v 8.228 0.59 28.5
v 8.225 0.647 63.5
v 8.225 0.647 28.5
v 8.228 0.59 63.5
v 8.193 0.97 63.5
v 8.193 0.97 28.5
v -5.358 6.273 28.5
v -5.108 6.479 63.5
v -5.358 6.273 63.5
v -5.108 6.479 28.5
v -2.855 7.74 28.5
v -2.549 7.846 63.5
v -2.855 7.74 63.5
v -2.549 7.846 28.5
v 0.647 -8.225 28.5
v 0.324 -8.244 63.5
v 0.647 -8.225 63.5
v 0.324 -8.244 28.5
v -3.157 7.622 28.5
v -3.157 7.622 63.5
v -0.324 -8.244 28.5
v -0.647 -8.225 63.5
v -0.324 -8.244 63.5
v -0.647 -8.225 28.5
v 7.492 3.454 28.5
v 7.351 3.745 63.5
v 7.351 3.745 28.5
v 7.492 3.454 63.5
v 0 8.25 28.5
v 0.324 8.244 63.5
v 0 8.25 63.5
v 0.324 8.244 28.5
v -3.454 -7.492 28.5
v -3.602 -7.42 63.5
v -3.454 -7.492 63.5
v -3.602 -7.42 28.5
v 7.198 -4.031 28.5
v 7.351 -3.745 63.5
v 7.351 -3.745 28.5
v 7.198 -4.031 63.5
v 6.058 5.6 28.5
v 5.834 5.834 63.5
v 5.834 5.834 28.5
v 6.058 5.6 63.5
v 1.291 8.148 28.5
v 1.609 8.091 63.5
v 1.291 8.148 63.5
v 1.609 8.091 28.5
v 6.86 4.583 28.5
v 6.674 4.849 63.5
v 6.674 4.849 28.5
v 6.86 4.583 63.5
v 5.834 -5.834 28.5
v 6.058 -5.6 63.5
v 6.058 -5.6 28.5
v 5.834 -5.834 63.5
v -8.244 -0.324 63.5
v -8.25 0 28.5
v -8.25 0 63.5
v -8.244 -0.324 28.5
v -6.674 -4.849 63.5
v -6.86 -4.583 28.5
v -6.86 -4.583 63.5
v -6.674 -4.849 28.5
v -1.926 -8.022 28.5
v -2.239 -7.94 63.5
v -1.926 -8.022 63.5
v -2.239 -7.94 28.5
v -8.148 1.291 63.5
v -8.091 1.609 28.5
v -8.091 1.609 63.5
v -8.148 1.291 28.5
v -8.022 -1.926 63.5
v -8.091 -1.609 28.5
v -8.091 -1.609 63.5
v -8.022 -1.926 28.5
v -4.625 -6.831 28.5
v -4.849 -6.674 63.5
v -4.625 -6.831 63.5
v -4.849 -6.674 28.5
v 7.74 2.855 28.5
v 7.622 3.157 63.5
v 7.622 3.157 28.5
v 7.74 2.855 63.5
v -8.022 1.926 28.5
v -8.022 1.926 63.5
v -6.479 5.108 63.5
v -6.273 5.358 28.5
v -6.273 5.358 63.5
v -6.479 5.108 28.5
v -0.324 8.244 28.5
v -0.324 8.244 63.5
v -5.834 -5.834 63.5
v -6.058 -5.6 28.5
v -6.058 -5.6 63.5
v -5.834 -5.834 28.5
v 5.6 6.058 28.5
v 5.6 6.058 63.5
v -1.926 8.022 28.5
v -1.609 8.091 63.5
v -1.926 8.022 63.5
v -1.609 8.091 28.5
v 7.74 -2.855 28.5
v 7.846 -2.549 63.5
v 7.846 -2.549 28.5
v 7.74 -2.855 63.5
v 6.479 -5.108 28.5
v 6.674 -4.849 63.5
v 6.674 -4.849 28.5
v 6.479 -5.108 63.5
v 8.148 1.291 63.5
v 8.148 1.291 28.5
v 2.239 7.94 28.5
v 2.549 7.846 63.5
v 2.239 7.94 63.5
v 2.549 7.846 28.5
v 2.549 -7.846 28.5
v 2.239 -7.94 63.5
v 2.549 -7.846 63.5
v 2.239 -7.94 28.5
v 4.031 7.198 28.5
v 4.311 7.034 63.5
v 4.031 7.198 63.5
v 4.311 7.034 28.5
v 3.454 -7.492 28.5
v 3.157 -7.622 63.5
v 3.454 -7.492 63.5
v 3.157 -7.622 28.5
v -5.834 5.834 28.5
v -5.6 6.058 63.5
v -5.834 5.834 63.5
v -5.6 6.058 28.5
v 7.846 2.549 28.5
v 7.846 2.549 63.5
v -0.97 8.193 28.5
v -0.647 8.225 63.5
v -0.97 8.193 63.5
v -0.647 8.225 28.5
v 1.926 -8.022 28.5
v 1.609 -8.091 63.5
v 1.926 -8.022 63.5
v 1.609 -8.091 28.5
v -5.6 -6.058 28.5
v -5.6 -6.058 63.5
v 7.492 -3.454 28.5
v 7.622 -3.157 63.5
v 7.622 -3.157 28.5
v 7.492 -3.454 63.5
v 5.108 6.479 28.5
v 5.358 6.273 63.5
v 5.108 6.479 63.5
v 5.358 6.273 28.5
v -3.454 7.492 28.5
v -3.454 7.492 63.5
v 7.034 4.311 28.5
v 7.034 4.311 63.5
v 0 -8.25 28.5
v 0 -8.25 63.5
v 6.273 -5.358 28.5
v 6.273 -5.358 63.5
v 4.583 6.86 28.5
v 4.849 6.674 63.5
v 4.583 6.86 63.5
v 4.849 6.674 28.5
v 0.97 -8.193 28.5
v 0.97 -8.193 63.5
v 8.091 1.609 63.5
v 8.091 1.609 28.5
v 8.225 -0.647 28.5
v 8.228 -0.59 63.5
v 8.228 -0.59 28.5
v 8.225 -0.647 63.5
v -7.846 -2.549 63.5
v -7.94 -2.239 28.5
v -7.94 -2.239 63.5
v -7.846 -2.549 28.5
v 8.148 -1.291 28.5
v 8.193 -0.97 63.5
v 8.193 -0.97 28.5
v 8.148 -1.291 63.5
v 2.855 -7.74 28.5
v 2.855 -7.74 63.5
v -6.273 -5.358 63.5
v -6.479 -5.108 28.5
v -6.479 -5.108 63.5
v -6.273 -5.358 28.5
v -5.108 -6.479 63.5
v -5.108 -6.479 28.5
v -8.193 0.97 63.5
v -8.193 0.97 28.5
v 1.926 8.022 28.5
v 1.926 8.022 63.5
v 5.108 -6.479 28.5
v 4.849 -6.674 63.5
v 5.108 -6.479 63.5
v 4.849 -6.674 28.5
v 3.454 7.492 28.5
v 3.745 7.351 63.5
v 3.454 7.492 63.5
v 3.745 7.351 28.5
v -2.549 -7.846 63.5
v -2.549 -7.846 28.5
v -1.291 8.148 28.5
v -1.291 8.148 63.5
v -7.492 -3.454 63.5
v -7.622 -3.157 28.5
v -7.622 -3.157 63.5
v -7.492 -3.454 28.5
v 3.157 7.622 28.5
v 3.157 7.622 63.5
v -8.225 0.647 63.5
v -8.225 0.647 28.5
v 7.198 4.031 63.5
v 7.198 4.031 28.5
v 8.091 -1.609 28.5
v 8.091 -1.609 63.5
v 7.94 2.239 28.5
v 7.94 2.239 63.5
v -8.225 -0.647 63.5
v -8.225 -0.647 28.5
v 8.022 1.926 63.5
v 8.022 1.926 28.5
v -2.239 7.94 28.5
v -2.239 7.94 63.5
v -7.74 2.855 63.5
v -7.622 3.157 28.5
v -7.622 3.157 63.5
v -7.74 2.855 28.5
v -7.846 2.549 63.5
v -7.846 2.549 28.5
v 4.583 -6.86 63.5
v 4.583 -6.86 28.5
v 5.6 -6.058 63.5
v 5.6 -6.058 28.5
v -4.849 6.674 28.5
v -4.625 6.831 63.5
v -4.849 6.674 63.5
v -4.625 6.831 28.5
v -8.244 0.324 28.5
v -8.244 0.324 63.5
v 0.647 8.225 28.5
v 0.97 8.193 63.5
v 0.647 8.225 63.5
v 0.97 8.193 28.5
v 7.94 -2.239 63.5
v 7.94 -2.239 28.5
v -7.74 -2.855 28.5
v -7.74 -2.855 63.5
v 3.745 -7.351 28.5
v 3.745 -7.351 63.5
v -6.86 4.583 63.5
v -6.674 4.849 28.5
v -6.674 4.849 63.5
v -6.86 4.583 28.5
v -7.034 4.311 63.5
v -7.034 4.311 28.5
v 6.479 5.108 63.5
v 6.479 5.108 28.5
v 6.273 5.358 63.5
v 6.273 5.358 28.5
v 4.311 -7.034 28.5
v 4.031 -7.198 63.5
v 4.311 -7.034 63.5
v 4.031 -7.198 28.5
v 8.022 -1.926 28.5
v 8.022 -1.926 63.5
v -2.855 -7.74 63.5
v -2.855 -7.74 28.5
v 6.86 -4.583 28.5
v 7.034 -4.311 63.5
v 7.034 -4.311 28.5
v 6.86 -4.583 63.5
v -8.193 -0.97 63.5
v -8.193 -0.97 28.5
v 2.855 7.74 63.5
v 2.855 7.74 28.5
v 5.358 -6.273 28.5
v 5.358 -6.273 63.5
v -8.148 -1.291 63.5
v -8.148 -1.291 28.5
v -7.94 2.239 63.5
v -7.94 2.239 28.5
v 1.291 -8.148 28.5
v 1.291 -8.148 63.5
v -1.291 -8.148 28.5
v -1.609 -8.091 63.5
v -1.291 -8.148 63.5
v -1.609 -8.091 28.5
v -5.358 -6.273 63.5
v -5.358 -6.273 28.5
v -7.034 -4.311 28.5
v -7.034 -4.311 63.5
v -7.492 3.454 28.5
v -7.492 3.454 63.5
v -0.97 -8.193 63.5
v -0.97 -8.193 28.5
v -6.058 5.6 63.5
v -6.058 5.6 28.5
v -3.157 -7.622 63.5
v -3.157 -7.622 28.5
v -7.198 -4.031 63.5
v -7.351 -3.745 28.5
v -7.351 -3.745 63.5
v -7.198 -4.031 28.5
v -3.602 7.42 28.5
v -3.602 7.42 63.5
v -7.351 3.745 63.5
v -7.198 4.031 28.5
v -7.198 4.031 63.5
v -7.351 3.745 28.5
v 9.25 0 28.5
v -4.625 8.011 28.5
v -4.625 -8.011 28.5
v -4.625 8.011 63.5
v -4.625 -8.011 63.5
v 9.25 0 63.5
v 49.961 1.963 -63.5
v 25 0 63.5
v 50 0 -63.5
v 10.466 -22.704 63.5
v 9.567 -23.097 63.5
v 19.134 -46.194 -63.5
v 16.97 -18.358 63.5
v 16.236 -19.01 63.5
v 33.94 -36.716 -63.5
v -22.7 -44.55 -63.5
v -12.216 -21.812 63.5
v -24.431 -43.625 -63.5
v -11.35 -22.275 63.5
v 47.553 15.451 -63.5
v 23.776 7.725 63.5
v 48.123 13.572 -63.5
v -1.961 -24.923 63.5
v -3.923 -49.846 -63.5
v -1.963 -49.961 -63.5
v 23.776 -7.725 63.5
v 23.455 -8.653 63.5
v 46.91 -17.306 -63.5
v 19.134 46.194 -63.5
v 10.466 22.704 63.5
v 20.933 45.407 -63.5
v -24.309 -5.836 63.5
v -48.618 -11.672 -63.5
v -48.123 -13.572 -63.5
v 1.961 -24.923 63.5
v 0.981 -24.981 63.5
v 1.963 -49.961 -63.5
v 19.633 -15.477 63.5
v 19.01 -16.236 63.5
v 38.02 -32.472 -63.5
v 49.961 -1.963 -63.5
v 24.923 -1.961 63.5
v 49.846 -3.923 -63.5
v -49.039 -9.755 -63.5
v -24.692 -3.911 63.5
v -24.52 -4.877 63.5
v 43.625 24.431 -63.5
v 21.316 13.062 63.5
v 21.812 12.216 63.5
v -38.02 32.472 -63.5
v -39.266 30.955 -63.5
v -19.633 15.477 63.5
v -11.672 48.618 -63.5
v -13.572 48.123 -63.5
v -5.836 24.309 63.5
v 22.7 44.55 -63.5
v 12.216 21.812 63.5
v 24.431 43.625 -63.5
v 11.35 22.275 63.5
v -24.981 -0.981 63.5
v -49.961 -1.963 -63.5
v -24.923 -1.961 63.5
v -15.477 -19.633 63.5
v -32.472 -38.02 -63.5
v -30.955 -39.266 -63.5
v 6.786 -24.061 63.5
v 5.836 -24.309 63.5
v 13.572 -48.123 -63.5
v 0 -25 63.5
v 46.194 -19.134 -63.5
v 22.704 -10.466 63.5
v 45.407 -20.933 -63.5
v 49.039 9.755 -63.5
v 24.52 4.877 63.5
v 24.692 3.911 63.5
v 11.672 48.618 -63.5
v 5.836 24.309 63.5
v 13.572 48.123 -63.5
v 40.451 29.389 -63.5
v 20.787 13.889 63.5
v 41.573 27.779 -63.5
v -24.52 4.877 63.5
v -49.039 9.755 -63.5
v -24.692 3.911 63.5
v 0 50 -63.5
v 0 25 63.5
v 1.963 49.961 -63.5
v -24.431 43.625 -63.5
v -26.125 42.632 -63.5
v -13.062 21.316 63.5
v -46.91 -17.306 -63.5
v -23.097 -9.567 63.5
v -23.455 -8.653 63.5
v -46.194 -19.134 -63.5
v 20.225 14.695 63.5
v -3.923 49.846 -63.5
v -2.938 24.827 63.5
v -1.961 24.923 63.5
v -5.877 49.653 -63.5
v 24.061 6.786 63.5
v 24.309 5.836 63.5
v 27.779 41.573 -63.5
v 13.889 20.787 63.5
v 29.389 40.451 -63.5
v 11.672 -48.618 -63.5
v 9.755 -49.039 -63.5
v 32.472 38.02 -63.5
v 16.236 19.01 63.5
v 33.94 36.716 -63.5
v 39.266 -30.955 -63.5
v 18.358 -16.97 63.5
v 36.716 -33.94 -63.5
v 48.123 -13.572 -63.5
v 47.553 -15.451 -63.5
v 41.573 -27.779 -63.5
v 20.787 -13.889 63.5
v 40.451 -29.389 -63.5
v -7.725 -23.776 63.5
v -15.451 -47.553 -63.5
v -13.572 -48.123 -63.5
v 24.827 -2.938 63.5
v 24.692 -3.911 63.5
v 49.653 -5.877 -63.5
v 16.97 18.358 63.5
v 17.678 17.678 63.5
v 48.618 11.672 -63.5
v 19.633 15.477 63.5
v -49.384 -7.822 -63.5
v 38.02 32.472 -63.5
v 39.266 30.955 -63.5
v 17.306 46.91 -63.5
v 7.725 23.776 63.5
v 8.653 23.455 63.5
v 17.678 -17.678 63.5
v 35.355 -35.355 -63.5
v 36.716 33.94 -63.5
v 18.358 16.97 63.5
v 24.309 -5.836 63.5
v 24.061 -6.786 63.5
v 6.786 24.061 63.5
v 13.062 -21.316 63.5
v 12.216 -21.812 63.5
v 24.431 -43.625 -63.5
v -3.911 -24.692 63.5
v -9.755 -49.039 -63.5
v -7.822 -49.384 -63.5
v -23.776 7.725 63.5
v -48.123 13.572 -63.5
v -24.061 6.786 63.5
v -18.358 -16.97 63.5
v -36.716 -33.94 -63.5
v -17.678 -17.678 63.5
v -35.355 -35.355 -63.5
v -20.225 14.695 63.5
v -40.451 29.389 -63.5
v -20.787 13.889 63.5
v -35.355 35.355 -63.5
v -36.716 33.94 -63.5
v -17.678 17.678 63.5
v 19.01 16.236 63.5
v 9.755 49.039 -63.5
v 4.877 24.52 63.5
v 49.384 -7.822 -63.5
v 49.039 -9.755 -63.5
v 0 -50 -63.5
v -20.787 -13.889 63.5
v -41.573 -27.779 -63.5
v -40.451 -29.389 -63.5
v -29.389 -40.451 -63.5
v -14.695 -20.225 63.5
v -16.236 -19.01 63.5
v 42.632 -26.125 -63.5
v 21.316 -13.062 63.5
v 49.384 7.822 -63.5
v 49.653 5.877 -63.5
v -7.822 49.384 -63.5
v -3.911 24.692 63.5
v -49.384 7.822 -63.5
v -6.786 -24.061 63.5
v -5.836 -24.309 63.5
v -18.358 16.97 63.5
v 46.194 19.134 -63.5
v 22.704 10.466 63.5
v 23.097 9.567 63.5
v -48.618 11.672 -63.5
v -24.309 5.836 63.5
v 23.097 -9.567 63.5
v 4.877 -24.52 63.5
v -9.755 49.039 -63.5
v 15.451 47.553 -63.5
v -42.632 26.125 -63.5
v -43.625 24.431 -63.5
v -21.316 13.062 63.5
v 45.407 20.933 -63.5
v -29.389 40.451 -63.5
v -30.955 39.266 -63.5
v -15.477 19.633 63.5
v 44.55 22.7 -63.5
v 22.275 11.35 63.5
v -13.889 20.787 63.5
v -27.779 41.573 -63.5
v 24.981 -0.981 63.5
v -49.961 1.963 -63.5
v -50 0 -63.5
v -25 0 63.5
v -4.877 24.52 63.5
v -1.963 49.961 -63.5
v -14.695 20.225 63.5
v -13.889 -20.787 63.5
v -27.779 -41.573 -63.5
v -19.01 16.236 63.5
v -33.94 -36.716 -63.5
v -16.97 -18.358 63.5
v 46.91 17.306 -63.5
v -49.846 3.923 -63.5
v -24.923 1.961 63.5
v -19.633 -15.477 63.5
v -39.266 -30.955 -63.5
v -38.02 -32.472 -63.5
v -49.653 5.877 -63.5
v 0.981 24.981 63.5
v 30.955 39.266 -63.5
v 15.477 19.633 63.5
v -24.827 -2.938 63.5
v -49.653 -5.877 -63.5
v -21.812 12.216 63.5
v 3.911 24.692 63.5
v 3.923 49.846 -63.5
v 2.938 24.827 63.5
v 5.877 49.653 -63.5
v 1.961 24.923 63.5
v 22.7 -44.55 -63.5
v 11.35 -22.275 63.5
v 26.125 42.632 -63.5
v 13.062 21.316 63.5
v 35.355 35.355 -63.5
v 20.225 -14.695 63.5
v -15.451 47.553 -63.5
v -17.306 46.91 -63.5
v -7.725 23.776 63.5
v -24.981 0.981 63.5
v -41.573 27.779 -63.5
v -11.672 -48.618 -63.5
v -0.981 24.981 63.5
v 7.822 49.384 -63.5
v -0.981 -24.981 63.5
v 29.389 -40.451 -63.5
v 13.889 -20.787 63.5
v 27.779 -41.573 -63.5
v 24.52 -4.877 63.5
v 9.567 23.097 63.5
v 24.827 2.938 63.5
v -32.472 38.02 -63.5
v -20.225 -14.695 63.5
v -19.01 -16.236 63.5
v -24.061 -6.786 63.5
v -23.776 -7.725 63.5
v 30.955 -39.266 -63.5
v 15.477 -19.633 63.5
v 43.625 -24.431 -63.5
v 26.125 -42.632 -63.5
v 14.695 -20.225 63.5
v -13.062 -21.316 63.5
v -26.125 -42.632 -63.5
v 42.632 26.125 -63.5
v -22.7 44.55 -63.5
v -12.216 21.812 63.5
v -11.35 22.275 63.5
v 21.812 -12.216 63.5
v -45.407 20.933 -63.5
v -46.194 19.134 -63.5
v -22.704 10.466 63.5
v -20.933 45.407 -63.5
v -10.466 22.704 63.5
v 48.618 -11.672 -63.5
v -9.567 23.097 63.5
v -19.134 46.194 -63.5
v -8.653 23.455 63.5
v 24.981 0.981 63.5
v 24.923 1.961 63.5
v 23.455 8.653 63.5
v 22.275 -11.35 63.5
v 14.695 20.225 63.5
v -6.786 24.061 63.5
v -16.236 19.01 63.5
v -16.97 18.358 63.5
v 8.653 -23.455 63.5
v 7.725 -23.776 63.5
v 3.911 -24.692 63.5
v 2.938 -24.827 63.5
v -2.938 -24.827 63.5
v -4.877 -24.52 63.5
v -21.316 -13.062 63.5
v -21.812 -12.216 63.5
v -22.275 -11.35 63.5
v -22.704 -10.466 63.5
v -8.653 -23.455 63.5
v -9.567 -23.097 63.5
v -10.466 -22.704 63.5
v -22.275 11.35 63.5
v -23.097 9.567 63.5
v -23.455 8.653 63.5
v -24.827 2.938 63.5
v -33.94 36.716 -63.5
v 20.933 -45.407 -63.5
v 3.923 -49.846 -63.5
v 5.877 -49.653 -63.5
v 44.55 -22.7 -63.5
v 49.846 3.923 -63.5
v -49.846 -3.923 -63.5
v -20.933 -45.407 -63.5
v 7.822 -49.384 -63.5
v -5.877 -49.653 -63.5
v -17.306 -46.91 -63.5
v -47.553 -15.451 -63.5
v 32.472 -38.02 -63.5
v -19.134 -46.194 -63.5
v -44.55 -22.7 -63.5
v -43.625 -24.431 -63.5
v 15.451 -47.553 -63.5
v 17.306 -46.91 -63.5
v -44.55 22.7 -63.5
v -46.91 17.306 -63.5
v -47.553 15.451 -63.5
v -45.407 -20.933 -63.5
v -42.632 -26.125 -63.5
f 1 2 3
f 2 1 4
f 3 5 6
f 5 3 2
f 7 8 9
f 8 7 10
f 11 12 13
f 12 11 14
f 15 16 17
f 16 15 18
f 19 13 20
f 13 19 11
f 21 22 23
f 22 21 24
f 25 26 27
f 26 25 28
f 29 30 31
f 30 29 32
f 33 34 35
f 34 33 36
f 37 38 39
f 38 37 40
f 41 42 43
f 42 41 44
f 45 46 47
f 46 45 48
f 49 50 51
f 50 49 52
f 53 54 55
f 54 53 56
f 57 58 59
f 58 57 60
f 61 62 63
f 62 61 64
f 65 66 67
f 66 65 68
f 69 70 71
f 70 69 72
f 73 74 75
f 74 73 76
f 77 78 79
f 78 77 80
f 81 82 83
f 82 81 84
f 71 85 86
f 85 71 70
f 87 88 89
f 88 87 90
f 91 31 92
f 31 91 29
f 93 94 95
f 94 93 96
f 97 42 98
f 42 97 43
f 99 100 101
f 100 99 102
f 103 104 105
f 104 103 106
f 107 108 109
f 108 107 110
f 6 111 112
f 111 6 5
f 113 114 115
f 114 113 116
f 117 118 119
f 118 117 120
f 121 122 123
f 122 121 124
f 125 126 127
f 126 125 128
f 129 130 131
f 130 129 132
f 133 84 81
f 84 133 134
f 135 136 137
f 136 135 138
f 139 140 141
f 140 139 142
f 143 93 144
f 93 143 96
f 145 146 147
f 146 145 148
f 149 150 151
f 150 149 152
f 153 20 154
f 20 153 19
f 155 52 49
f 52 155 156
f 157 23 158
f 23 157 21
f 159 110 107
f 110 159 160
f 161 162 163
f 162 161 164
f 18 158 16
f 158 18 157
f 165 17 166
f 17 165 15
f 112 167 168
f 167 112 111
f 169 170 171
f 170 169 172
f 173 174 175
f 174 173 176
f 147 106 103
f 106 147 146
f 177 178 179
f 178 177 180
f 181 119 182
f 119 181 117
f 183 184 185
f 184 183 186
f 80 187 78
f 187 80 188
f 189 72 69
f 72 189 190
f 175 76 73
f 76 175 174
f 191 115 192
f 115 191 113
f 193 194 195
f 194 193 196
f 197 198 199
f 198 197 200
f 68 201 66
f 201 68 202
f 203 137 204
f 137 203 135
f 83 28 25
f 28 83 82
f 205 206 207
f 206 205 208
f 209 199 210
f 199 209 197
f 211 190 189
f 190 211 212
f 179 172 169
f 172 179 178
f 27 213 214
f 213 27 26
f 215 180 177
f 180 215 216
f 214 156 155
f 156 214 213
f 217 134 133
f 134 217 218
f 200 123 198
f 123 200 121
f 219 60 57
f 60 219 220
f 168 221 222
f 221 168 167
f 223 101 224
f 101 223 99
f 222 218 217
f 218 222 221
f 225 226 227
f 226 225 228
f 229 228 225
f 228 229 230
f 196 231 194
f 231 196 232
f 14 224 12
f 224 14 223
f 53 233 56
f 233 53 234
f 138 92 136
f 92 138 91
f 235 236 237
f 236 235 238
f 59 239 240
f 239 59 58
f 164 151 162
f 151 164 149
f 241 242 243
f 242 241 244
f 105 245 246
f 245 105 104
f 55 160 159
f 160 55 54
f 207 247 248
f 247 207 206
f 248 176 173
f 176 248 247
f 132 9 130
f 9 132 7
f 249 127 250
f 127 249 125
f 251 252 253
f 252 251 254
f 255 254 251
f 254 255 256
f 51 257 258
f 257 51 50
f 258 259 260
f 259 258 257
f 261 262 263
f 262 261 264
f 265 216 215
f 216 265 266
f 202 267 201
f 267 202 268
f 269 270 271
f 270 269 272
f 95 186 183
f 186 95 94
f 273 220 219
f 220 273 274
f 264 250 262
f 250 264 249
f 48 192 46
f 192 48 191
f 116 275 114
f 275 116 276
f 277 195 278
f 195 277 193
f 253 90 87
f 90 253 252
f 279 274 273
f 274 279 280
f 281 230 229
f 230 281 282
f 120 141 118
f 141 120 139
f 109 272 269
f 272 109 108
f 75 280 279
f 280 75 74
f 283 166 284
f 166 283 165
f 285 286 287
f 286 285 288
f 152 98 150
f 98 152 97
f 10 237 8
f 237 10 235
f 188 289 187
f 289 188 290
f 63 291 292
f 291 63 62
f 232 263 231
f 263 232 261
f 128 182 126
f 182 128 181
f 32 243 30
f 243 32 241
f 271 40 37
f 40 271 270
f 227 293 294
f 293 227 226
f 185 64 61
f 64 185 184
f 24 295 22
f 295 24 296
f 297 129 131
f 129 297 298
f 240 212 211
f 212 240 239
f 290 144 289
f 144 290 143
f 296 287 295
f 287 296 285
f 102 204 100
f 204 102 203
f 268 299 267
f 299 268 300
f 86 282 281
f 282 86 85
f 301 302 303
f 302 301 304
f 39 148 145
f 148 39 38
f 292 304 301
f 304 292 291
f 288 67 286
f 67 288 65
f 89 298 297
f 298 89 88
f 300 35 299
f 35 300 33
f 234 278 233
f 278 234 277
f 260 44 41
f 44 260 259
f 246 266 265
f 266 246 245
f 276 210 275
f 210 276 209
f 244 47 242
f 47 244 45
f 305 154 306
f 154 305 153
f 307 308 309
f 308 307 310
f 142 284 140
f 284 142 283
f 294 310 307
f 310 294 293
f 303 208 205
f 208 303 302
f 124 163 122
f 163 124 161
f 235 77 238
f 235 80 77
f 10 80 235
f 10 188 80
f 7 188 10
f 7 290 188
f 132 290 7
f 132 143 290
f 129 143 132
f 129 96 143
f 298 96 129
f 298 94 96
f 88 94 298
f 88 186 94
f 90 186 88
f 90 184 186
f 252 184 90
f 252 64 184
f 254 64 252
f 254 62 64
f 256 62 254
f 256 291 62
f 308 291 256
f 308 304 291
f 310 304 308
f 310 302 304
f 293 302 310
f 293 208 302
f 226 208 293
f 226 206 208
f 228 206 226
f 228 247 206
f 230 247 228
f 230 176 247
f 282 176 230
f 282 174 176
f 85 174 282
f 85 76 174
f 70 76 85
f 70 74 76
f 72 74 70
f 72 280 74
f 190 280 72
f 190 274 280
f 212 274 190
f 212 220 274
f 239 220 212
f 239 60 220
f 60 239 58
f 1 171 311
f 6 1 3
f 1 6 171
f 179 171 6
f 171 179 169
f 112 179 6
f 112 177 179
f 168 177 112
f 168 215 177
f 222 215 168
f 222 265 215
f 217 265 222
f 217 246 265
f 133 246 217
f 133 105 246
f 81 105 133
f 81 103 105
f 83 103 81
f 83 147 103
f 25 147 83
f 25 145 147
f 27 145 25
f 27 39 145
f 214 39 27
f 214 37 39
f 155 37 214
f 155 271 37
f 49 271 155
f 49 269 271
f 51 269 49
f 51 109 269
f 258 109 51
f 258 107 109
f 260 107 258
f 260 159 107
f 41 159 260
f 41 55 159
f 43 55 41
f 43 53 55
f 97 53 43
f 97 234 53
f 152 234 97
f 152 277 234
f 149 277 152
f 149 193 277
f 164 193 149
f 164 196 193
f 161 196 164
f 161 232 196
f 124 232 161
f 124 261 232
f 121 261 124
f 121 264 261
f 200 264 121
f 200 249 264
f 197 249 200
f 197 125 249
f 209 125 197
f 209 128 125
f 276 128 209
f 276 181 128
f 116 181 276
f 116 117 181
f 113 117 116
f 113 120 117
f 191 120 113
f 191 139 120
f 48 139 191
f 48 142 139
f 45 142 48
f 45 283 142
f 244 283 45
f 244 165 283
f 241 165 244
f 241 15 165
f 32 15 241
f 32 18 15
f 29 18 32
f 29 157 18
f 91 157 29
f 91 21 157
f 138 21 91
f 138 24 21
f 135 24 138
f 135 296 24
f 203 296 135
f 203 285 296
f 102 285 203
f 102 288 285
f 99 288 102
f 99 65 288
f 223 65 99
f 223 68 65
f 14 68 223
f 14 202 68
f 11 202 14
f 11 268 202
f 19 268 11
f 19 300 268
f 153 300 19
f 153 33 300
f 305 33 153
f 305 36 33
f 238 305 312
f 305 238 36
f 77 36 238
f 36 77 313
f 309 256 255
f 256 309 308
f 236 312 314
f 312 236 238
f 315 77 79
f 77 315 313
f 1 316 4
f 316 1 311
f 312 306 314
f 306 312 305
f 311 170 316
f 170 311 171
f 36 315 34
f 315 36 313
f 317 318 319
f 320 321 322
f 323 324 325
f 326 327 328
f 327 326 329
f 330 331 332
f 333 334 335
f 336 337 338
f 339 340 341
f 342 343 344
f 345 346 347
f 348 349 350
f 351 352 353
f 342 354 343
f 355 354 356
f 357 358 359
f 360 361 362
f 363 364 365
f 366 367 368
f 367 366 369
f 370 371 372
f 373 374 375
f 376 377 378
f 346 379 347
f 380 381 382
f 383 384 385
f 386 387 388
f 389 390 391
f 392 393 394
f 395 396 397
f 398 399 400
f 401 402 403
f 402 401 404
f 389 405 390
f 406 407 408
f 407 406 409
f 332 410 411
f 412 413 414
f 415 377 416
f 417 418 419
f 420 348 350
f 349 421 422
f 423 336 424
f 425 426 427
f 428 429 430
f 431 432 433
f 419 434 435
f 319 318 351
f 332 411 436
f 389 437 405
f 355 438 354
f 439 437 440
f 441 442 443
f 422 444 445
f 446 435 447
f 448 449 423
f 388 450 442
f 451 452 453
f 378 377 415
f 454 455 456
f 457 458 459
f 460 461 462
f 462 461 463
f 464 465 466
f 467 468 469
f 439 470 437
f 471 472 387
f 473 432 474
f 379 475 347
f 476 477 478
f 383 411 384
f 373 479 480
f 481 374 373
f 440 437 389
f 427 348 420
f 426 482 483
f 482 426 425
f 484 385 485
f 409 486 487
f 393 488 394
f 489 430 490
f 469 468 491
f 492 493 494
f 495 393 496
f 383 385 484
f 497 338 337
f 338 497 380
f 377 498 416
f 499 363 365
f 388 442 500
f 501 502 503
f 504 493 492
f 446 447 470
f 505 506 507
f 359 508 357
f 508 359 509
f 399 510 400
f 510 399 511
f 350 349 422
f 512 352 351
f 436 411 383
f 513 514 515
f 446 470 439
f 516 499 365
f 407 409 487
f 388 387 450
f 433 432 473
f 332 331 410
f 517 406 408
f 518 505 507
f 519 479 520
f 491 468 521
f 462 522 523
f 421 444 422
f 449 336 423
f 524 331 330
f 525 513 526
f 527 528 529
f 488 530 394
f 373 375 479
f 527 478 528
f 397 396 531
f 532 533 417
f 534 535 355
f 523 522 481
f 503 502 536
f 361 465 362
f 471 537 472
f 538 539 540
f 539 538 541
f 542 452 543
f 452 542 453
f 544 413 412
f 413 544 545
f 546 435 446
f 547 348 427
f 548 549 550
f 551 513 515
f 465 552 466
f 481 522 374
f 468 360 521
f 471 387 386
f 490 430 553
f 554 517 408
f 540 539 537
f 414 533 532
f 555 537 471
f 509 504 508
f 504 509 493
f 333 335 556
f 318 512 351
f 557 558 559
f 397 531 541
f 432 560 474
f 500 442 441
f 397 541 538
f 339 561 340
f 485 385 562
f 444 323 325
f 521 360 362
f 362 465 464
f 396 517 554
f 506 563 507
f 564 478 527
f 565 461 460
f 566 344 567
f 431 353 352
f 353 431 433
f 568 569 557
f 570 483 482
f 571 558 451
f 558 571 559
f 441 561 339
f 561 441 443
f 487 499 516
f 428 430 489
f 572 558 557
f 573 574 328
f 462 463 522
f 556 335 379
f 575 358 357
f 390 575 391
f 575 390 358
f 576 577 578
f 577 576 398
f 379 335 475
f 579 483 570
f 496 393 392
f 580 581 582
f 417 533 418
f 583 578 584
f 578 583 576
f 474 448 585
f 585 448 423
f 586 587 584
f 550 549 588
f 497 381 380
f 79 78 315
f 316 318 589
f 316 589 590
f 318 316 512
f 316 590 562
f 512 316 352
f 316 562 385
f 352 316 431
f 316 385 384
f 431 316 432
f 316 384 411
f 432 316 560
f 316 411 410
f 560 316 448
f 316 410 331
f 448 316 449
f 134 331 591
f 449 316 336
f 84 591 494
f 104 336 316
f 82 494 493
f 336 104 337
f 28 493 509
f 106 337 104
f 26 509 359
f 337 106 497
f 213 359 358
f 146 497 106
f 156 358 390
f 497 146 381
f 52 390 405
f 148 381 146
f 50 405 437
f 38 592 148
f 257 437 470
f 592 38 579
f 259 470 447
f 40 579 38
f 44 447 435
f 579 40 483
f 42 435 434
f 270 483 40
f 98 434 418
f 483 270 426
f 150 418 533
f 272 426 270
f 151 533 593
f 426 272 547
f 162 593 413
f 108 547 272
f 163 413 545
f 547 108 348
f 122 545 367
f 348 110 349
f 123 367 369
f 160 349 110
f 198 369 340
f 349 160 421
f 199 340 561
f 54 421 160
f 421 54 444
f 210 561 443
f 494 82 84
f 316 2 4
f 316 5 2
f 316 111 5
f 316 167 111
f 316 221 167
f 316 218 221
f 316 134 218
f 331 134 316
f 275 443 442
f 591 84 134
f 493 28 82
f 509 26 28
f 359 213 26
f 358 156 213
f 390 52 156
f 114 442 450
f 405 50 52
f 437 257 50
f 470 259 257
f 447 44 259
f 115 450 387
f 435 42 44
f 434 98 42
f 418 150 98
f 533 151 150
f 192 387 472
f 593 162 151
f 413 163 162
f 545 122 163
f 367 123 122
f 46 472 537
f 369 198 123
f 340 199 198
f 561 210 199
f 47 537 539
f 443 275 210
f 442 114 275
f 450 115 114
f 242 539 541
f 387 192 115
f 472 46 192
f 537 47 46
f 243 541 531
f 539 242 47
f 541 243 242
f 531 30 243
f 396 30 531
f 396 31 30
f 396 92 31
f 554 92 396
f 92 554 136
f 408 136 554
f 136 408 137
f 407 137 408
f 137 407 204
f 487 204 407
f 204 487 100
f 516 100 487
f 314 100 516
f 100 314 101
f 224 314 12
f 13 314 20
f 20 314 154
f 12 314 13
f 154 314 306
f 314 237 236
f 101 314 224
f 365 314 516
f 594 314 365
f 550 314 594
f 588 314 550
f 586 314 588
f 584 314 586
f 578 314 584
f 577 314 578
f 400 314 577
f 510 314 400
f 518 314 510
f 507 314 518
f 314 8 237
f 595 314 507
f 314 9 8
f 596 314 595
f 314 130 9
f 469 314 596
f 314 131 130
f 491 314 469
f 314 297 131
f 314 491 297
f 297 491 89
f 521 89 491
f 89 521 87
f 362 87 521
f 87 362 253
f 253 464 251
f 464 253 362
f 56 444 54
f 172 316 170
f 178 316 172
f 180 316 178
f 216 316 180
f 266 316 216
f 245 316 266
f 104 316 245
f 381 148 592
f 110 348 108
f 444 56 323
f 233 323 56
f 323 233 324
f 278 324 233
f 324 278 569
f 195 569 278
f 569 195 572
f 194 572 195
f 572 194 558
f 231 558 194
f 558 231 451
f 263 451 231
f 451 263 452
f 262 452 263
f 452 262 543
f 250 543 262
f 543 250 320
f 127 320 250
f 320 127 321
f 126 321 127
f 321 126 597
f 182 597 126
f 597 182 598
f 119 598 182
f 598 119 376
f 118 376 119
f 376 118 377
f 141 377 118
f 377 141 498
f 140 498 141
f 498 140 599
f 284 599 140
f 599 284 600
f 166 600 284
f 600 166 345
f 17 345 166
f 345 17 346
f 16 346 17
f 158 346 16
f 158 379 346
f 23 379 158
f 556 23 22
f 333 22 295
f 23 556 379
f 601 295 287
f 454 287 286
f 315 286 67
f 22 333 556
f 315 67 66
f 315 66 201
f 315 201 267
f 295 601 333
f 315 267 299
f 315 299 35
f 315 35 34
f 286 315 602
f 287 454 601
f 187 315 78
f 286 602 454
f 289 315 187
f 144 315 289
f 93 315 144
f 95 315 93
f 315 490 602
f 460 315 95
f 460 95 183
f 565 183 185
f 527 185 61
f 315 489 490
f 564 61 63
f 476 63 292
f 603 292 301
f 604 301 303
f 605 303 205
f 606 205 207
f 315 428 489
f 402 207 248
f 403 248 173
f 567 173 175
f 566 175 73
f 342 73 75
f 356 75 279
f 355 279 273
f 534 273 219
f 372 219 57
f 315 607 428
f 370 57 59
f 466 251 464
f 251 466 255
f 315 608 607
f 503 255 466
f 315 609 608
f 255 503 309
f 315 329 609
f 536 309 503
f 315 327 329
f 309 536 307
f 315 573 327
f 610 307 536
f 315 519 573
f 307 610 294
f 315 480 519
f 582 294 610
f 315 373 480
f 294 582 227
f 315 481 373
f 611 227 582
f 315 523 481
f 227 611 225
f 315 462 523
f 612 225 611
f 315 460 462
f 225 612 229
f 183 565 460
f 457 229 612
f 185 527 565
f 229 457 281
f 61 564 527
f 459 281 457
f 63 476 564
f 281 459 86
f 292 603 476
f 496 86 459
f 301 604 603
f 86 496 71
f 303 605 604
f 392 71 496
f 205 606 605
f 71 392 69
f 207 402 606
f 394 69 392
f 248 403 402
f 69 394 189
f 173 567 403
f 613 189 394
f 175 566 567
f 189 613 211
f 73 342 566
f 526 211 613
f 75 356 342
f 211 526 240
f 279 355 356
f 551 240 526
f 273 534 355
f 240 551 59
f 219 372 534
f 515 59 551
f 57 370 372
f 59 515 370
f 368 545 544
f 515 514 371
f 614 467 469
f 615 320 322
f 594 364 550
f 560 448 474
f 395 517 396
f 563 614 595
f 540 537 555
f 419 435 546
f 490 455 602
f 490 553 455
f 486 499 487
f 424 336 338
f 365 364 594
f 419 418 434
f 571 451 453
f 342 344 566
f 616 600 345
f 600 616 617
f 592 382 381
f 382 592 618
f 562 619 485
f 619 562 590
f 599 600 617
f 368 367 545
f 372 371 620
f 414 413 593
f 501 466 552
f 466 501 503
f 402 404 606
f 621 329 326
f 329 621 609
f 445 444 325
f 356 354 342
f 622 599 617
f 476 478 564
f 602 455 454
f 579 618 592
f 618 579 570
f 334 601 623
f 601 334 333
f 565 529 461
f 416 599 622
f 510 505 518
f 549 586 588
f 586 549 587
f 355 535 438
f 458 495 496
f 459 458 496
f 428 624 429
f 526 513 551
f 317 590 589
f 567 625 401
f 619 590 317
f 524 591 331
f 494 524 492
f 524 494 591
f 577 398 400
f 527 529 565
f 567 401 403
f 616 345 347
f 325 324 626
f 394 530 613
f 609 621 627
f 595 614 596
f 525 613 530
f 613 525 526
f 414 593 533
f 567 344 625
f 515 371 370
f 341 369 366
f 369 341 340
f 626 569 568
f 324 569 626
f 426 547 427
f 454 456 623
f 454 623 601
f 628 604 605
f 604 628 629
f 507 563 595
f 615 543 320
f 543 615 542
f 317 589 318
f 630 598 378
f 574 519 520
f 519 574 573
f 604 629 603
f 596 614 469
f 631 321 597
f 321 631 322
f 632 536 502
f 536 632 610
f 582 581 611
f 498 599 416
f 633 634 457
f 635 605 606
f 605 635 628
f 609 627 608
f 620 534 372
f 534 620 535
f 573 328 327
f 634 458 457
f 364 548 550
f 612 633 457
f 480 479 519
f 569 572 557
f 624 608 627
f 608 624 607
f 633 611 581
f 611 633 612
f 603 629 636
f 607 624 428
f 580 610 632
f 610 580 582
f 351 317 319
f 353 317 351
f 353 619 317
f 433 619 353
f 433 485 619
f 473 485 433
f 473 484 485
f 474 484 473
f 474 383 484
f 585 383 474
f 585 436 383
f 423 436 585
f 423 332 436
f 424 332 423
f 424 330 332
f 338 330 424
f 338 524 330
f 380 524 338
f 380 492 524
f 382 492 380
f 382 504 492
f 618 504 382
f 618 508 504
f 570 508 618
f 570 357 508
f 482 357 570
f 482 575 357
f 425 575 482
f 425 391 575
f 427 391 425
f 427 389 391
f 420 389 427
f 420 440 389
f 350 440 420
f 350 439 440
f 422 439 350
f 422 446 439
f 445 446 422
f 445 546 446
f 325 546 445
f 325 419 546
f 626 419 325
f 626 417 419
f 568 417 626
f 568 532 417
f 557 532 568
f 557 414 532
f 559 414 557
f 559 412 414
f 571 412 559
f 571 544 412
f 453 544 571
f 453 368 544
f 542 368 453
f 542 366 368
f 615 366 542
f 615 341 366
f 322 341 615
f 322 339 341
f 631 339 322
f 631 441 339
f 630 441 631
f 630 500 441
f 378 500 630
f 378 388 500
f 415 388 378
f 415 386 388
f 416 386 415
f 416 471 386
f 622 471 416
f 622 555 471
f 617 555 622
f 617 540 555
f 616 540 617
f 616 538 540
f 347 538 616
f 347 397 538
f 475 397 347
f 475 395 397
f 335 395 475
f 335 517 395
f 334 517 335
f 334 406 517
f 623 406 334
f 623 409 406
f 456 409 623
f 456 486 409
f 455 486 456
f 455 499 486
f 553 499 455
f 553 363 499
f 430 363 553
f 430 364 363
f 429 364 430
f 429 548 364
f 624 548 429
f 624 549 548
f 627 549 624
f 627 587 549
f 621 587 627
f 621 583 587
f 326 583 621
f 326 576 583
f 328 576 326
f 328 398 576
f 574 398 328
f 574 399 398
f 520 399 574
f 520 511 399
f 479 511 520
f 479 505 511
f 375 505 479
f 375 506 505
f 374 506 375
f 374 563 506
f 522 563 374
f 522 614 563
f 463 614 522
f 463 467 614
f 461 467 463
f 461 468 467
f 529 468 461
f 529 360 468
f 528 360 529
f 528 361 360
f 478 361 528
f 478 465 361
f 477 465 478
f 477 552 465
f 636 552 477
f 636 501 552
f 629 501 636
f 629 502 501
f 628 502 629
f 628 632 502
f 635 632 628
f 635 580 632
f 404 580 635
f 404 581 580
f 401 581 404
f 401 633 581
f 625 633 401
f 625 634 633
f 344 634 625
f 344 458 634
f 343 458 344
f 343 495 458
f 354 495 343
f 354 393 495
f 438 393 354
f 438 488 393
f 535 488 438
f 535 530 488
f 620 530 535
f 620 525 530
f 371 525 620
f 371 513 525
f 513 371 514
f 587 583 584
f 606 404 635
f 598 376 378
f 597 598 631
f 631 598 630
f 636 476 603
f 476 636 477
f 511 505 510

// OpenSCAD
support_r1 = 50;
support_r2 = 25;
support_h = 127;

hole_r = 8.25;
hole_depth = 70;

difference() {
    cylinder(r1=support_r1, r2=support_r2, h=support_h, center=true, $fn=160);
    
    translate([0, 0, (support_h / 2)]) {
        union() {
            cylinder(r=hole_r, h=hole_depth, center=true, $fn=160);
            cylinder(r=hole_r+1, h=hole_depth, center=true, $fn=3);
        }
    }
}
